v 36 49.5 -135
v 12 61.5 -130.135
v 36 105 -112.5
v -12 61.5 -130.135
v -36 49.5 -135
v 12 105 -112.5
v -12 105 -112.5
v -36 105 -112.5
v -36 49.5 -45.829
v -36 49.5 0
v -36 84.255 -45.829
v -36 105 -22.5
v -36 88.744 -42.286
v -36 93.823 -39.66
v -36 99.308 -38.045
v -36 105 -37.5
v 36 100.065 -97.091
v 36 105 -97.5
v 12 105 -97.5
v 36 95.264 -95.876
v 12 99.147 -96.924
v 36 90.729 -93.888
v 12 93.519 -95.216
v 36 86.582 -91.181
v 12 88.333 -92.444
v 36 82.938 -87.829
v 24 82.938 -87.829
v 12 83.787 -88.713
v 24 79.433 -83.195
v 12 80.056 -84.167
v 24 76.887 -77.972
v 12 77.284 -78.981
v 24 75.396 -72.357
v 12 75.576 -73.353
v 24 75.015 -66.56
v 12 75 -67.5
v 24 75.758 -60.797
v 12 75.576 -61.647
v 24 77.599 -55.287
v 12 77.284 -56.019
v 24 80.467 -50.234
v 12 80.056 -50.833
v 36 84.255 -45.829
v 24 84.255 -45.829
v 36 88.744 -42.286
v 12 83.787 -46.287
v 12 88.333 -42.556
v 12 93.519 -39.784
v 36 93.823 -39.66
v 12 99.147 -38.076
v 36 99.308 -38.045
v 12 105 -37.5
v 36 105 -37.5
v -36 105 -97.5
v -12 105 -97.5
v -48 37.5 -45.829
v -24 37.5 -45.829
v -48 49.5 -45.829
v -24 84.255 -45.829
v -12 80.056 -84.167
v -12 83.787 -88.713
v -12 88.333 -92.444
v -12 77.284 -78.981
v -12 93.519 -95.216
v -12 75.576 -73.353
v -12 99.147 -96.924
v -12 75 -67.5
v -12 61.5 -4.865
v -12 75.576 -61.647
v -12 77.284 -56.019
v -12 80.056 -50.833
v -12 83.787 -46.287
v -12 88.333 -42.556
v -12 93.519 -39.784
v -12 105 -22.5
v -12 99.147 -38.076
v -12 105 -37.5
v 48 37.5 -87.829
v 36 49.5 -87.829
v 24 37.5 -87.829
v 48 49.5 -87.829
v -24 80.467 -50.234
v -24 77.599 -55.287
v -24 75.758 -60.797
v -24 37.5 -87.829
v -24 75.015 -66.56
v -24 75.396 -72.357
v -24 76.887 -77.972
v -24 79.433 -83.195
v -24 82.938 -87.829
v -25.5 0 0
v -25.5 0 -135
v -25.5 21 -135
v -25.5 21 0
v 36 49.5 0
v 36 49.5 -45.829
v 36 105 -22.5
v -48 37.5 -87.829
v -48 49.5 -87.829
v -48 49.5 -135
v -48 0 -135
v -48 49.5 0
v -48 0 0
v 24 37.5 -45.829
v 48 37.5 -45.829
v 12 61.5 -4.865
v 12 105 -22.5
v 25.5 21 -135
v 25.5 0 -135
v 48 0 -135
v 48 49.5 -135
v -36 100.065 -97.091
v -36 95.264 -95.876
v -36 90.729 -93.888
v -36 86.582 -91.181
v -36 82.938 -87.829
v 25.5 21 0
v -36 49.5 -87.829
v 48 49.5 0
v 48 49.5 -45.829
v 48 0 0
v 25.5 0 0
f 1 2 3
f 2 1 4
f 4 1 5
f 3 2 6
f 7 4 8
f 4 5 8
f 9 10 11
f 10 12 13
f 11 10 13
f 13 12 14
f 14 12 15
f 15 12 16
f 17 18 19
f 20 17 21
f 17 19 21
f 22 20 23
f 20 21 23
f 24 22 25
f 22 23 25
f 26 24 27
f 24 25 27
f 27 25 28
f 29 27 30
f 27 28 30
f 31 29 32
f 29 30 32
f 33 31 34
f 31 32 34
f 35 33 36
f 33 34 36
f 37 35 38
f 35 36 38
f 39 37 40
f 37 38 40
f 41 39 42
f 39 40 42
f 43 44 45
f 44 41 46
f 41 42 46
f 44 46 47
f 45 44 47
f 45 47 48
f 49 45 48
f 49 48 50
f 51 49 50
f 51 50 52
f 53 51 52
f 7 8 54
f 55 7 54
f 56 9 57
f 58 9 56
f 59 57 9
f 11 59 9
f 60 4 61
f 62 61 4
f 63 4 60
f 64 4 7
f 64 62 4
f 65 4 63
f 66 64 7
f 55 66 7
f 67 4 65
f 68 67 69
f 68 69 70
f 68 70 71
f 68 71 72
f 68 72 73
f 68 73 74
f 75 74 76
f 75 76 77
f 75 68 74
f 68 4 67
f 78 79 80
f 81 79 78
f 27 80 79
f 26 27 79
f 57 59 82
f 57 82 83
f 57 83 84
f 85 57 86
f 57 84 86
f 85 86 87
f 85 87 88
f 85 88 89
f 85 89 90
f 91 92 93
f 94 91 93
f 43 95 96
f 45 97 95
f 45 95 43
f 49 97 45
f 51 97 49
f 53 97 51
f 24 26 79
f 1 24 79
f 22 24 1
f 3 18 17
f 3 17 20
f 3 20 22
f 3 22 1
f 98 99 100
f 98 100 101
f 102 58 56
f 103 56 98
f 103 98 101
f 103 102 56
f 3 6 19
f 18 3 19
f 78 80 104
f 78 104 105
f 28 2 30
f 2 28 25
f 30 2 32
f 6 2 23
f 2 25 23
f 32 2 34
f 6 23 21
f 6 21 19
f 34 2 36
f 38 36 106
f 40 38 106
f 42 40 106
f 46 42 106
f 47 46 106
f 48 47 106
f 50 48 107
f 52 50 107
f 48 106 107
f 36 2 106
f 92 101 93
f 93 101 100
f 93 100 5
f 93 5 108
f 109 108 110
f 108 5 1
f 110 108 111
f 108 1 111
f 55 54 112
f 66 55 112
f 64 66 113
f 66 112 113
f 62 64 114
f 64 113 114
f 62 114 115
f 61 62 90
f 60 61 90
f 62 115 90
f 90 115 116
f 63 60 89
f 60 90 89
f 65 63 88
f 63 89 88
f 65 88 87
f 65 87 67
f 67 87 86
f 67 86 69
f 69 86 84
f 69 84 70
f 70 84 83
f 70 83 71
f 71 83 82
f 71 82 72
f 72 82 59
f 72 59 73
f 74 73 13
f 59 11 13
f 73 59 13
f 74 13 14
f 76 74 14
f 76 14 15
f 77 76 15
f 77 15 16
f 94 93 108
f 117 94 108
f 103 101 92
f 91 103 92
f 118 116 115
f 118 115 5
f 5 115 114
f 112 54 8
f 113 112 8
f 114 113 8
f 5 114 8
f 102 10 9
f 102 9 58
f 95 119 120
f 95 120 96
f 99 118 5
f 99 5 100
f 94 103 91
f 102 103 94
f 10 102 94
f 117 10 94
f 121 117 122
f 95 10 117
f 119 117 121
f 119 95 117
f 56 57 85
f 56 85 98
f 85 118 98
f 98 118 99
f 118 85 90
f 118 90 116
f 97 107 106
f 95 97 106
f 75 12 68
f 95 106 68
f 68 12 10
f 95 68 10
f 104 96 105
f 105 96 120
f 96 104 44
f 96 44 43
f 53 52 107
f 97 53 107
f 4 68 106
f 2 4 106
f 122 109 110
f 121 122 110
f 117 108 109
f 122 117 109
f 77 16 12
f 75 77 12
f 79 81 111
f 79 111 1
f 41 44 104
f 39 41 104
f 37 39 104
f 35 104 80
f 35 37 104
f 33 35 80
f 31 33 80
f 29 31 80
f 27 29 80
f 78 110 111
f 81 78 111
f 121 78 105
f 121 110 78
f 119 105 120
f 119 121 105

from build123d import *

# Parameters (mm, degrees)
BOSS_EXTRUDE1_DEPTH      = 135
BOSS_EXTRUDE2_DEPTH      = 36
BOSS_EXTRUDE2_DEPTH_BACK = 36
SKETCH3_W                = 24
SKETCH3_H                = 43.5
CUT_EXTRUDE1_DEPTH       = 178.634456117
SKETCH4_W                = 24
SKETCH4_H                = 42
CUT_EXTRUDE2_DEPTH       = 67.5


with BuildPart() as part:
    # Sketch1 → Boss-Extrude1 (new body)
    with BuildSketch(Plane.XY):
        Polygon((-48, 49.5), (-48, 0), (-25.5, 0), (-25.5, 21), (25.5, 21), (25.5, 0), (48, 0), (48, 49.5), align=None)
    extrude(amount=-BOSS_EXTRUDE1_DEPTH)

    # Sketch2 → Boss-Extrude2 (add, two sides: drawn at the far end of the back side and taken through both)
    with BuildSketch(Plane(origin=(0, 0, 0), x_dir=(0, 0, -1), z_dir=(1, 0, 0)).offset(-BOSS_EXTRUDE2_DEPTH_BACK)):
        with BuildLine():
            Line((37.5, 105), (22.5, 105))
            Line((22.5, 105), (0, 49.5))
            Line((0, 49.5), (135, 49.5))
            Line((135, 49.5), (112.5, 105))
            Line((112.5, 105), (97.5, 105))
            ThreePointArc((97.5, 105), (67.5, 75), (37.5, 105))
        make_face()
    extrude(amount=BOSS_EXTRUDE2_DEPTH + BOSS_EXTRUDE2_DEPTH_BACK)

    # Sketch3 → Cut-Extrude1 (cut, through all)
    with BuildSketch(Plane.XY):
        with Locations((0, 83.25)):
            Rectangle(SKETCH3_W, SKETCH3_H)
    extrude(amount=-CUT_EXTRUDE1_DEPTH, mode=Mode.SUBTRACT)

    # Sketch4 → Cut-Extrude2 (cut)
    with BuildSketch(Plane(origin=(0, 105, 0), x_dir=(1, 0, 0), z_dir=(0, 1, 0))):
        with Locations((36, 66.828706639)):
            Rectangle(SKETCH4_W, SKETCH4_H)
    cut_extrude2 = extrude(amount=-CUT_EXTRUDE2_DEPTH, mode=Mode.SUBTRACT)

    # Mirror1: Cut-Extrude2 across plane
    add(cut_extrude2.mirror(Plane(origin=(0, 0, 0), x_dir=(0, 0, 1), z_dir=(1, 0, 0))), mode=Mode.SUBTRACT)


solid = part.part
